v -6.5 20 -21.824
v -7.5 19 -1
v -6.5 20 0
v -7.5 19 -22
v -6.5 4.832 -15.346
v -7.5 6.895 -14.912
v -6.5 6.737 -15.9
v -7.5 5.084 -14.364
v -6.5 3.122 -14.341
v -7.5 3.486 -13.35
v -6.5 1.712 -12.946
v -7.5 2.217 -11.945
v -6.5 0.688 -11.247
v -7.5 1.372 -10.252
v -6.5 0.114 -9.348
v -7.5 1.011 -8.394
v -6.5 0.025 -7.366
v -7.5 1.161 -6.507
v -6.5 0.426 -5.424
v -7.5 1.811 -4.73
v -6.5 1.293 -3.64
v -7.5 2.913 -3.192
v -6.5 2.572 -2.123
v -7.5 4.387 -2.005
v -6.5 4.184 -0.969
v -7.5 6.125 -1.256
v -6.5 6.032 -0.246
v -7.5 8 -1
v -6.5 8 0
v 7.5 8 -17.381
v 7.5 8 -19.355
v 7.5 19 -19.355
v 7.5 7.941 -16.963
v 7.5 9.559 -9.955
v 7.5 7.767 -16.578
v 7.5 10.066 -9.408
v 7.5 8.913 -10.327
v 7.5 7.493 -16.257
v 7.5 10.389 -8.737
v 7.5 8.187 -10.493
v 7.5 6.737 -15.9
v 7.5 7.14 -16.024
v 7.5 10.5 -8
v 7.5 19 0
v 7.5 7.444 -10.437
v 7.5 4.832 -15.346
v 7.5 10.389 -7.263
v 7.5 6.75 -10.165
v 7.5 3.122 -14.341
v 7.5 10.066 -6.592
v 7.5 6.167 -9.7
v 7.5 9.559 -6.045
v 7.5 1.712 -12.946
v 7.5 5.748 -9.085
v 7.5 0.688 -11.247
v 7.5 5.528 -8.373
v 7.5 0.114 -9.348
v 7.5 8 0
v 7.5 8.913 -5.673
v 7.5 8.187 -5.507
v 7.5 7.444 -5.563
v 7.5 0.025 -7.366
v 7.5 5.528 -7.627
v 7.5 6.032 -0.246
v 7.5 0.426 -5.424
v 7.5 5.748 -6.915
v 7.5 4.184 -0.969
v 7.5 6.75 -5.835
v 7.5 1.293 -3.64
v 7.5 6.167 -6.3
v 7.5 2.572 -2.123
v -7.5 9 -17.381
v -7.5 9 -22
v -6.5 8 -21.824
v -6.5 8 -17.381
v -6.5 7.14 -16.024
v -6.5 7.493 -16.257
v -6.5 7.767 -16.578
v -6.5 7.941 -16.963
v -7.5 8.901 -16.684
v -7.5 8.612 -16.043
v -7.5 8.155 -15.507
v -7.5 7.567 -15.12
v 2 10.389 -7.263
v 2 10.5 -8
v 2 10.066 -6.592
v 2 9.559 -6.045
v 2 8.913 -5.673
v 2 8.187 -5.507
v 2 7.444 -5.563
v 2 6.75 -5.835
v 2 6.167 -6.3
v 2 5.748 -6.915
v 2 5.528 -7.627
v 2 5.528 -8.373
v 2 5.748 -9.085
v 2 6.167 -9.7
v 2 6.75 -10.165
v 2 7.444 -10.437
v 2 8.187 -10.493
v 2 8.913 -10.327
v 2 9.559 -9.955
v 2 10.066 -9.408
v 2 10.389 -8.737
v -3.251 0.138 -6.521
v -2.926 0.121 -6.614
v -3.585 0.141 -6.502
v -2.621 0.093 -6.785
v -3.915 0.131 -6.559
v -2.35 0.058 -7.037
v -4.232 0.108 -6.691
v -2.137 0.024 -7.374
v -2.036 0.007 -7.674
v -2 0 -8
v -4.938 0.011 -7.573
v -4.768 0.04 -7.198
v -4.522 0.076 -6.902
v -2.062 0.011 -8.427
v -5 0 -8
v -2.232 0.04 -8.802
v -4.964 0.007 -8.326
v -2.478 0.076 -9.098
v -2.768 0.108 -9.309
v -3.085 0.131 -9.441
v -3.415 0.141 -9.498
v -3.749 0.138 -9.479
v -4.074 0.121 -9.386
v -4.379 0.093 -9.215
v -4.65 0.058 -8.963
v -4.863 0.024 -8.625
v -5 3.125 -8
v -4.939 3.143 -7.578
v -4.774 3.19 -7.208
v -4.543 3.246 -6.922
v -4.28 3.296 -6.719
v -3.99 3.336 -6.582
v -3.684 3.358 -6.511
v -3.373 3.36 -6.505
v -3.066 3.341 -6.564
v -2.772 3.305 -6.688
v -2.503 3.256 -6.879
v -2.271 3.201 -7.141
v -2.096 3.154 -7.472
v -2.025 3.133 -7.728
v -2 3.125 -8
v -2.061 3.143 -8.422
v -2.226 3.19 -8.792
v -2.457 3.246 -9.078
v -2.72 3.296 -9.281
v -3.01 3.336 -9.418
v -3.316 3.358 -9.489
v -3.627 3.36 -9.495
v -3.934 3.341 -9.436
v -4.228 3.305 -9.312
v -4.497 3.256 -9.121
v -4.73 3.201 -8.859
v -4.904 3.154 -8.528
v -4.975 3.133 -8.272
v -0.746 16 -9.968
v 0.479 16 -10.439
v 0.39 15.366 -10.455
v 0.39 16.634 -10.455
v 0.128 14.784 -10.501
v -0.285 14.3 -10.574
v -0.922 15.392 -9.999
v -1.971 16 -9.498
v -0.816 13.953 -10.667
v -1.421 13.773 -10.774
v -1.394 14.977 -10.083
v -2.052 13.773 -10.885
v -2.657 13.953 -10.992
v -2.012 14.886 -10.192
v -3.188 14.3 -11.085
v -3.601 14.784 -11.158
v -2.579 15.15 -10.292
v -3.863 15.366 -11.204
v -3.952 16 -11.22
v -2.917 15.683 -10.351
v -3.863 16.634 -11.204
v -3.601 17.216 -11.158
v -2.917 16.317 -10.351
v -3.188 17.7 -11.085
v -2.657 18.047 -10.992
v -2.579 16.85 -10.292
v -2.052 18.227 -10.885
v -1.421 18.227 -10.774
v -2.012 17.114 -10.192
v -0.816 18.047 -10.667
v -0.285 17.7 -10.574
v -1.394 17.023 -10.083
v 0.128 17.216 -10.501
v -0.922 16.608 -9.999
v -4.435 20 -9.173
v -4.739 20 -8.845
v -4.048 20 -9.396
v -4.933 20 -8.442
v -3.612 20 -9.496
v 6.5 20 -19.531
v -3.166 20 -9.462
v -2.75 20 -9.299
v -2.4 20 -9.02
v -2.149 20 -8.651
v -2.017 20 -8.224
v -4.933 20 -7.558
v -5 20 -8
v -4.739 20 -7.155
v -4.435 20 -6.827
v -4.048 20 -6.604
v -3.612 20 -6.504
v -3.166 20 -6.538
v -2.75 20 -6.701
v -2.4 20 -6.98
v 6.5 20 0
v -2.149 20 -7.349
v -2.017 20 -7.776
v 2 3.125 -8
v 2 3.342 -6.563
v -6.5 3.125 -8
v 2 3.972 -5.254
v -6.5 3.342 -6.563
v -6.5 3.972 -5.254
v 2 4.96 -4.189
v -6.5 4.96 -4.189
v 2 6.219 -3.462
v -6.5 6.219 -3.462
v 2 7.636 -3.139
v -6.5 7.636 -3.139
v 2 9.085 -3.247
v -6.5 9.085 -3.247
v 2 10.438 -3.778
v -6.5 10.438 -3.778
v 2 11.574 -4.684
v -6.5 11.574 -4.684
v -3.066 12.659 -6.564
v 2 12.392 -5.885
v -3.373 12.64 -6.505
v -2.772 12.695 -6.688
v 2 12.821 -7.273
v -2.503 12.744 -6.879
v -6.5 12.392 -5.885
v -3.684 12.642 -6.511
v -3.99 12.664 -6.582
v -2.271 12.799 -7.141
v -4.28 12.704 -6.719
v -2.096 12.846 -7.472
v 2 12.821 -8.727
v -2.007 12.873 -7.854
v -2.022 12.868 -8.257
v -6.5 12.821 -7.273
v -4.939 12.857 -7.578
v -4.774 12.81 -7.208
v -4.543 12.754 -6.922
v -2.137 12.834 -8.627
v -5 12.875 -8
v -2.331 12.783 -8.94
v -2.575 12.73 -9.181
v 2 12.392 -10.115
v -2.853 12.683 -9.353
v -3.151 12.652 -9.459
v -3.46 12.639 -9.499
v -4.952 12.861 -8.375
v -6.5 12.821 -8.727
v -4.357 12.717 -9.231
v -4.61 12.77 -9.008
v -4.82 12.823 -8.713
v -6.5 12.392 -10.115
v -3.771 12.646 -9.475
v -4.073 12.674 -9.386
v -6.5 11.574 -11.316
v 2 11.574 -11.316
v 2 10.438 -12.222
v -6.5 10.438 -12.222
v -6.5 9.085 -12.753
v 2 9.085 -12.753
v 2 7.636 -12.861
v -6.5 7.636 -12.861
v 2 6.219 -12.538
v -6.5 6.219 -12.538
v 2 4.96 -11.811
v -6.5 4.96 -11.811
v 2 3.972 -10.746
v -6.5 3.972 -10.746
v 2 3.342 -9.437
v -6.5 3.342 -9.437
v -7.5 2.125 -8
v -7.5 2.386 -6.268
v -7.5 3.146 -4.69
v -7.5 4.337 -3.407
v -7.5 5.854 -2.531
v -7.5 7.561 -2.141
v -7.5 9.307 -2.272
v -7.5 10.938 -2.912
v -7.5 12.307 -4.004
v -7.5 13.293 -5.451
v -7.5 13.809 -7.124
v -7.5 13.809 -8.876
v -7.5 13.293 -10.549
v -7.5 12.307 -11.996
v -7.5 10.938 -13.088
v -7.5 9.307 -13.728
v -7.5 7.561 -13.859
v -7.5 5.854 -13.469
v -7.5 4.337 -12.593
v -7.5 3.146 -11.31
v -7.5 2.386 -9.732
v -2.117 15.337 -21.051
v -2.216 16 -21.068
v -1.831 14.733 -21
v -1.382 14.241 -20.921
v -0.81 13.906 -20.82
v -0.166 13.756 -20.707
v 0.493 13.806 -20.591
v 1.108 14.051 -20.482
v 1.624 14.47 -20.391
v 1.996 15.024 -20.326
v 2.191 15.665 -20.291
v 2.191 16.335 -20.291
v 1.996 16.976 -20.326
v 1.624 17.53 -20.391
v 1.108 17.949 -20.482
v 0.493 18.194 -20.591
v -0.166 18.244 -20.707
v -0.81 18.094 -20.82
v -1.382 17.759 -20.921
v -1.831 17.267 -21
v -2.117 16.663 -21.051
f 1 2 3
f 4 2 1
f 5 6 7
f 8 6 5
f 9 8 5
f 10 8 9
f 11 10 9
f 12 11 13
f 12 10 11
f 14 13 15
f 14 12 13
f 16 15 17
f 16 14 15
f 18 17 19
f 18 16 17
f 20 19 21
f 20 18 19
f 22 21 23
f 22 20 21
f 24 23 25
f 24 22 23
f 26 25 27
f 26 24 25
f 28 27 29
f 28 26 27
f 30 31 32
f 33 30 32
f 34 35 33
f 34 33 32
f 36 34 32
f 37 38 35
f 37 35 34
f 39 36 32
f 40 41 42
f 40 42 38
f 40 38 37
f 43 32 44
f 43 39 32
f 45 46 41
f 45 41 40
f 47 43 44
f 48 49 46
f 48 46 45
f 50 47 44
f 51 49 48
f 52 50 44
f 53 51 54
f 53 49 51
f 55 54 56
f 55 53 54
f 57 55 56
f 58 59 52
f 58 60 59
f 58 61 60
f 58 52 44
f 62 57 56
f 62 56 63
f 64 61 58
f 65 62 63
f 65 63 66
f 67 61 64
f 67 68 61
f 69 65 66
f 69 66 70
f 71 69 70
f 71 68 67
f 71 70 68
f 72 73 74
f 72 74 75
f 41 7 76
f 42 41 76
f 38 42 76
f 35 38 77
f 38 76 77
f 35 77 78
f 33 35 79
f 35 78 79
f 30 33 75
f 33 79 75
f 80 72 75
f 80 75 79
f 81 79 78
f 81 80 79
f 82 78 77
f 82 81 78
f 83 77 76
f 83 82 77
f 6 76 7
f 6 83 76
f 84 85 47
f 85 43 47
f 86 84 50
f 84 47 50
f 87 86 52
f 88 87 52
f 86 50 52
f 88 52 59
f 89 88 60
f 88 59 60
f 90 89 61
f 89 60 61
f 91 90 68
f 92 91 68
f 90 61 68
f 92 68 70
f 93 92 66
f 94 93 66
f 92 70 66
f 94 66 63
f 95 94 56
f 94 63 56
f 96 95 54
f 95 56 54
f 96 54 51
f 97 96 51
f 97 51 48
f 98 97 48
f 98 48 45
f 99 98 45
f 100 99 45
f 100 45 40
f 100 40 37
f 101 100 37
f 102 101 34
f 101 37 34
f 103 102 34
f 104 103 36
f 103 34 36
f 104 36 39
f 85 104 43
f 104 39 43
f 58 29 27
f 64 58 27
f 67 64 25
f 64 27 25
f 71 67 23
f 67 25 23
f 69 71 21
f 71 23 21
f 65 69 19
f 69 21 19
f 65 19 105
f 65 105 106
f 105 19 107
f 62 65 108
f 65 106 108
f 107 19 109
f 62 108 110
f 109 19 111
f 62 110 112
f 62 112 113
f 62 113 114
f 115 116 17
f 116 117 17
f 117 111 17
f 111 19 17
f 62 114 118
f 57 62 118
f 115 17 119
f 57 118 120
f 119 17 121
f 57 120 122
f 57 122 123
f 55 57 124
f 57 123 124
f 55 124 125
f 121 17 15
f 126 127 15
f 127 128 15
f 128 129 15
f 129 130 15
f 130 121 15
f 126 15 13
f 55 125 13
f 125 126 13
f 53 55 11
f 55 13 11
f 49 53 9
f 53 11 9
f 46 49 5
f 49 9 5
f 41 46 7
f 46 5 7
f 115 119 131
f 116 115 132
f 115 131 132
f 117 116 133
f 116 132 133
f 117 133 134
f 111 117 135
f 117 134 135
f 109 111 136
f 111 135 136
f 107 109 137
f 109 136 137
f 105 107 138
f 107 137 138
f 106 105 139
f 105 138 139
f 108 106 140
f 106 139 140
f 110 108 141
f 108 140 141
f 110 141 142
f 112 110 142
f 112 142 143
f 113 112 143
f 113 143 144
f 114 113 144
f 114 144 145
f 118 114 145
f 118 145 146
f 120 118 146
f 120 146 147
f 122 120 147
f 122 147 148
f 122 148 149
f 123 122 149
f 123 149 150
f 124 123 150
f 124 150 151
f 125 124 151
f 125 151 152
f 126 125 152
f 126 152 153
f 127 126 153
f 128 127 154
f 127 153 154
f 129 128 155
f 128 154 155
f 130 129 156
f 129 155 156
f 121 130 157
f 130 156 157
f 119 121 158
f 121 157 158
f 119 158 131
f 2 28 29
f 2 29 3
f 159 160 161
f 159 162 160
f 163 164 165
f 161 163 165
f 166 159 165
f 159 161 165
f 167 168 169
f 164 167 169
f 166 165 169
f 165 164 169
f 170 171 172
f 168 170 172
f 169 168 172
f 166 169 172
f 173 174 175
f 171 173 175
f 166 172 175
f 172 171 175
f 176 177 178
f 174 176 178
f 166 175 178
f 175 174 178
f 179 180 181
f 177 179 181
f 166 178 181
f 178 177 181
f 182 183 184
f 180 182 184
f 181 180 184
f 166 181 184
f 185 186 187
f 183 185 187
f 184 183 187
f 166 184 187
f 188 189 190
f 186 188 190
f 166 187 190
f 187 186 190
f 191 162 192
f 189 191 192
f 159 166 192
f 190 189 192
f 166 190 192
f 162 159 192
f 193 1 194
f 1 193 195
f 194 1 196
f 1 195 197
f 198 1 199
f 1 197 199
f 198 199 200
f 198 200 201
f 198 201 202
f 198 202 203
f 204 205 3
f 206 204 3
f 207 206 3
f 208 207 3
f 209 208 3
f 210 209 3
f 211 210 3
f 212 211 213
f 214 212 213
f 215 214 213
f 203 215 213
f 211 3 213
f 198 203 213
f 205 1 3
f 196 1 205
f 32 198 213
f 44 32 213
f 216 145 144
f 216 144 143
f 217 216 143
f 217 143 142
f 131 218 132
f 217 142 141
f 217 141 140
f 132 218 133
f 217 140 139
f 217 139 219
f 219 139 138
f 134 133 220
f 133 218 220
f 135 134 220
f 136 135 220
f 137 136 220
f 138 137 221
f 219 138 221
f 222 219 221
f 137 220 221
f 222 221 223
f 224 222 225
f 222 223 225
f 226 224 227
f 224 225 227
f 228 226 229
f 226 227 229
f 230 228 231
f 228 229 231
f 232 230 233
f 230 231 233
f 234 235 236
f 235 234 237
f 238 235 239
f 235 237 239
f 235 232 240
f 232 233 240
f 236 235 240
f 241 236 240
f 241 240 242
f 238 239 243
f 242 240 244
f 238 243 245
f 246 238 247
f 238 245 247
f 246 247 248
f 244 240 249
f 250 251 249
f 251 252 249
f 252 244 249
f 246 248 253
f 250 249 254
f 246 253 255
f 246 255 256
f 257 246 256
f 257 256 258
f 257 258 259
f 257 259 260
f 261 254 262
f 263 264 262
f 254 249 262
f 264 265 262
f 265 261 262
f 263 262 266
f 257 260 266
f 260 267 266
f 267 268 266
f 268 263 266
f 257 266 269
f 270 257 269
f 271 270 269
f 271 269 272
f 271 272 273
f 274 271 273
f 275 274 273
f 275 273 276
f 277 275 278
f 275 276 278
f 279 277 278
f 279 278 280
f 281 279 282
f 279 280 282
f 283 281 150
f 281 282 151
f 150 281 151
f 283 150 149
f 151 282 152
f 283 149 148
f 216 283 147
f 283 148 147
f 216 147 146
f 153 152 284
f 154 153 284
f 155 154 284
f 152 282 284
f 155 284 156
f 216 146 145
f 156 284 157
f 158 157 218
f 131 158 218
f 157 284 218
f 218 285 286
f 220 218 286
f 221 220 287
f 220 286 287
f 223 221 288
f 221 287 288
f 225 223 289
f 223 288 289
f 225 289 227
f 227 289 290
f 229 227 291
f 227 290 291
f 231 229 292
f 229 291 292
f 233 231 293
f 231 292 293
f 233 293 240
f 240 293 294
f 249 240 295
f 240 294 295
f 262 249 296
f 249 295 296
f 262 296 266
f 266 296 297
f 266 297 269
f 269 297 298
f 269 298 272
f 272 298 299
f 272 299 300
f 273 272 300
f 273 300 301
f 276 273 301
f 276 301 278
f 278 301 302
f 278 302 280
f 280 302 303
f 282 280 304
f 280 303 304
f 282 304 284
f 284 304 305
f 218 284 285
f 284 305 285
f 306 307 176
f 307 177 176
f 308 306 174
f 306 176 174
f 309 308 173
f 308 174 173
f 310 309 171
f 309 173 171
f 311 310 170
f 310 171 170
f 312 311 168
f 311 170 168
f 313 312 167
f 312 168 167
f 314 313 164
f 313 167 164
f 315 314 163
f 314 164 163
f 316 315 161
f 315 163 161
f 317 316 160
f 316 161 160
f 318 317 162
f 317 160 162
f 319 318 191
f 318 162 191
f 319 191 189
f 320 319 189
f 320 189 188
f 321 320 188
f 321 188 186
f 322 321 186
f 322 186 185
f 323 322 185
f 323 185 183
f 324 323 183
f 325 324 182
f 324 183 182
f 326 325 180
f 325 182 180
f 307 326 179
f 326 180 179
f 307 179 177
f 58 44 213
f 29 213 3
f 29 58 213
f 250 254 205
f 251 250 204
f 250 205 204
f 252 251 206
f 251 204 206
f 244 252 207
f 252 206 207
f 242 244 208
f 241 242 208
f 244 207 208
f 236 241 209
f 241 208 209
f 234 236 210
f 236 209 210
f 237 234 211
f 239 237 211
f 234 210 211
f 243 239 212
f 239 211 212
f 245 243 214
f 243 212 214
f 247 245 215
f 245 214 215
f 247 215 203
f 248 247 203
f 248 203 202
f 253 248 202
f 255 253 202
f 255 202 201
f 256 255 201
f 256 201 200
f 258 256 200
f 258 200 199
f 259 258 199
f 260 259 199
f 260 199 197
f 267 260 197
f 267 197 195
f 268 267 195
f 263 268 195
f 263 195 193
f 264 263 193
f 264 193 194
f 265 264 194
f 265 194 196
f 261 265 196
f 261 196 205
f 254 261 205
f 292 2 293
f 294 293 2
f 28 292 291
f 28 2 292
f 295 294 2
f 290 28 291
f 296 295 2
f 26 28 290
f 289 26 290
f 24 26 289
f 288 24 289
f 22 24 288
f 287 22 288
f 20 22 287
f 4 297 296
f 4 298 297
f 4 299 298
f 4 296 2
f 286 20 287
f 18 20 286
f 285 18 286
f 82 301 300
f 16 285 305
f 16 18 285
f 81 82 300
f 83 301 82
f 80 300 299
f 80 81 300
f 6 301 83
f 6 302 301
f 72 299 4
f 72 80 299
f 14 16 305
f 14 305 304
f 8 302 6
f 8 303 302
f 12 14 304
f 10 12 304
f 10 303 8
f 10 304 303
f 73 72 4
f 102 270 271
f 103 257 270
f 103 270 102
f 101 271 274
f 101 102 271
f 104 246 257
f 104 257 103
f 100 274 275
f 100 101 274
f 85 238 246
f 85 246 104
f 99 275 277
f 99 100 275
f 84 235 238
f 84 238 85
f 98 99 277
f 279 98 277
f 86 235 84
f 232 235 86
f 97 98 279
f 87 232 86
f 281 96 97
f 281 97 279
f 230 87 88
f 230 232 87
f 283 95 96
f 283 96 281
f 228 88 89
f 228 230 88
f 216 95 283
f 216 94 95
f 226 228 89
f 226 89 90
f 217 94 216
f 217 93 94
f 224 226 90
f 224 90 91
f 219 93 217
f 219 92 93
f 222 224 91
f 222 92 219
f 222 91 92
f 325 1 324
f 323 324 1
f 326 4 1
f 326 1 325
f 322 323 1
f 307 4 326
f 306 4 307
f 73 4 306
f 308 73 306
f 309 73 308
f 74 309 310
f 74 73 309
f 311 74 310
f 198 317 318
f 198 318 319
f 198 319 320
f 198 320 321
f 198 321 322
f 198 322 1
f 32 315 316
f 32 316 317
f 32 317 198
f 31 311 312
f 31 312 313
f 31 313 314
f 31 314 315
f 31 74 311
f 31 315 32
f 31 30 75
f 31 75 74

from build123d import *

# Parameters (mm, degrees)
F1_DEPTH       = 20
F3_D           = 5
F3_CBORE_D     = 9.75
F3_CBORE_DEPTH = 9.5
F5_D           = 4.5
F5_DEPTH       = 10
F5_TIP         = 1.3519363928
F6_R           = 1.5
F7_DEPTH       = 25
F9_DEPTH       = 15.001
F10_SIZE       = 1


with BuildPart() as f1:
    # F0 (on Front) → F1 (new body)
    with BuildSketch(Plane.XZ):
        Polygon((7.5, 0), (-7.5, 0), (-7.5, -22), (7.5, -19.3550952894), align=None)
    extrude(amount=-F1_DEPTH)

    # F3 (through all)
    with Locations(Plane(origin=(-7.5, 0, 0), x_dir=(0, -1, 0), z_dir=(-1, 0, 0))):
        with Locations((-8, -8)):
            CounterBoreHole(F3_D / 2, F3_CBORE_D / 2, F3_CBORE_DEPTH)

    # F5
    with Locations(Plane(origin=(3.5360689045, 0, -20.0540432912), x_dir=(0.984807753, 0, 0.1736481777), z_dir=(0.1736481777, 0, -0.984807753))):
        with Locations((-3.5906184671, -16)):
            Hole(F5_D / 2, depth=F5_DEPTH)
            with Locations((0, 0, -(F5_DEPTH + F5_TIP / 2))):  # 118° drill point
                Cone(0, F5_D / 2, F5_TIP, mode=Mode.SUBTRACT)

    # F6 (on face) → F7 (cut)
    with BuildSketch(Plane(origin=(0, 20, 0), x_dir=(-1, 0, 0), z_dir=(0, 1, 0))):
        with Locations((3.5, -8)):
            Circle(F6_R)
    extrude(amount=-F7_DEPTH, mode=Mode.SUBTRACT)

    # F8 (on face) → F9 (cut, through all)
    with BuildSketch(Plane(origin=(-7.5, 0, 0), x_dir=(0, -1, 0), z_dir=(-1, 0, 0))):
        with BuildLine():
            Line((0, 0), (-8, 0))
            ThreePointArc((-8, 0), (-2.3431457505, -2.3431457505), (0, -8))
            Line((0, -8), (0, 0))
        make_face()
        with BuildLine():
            Line((-8, -17.3808315196), (-8, -22))
            Line((-8, -22), (0, -22))
            Line((0, -22), (0, -8))
            ThreePointArc((0, -8), (-1.912912718, -13.1910854762), (-6.7368421053, -15.8996475955))
            ThreePointArc((-6.7368421053, -15.8996475955), (-7.6413288654, -16.4075029929), (-8, -17.3808315196))
        make_face()
    extrude(amount=-F9_DEPTH, mode=Mode.SUBTRACT)

    # F10
    f10_edges = [f1.edges().sort_by_distance(p)[0] for p in [
        (7.5, 20, -9.677548),
        (-7.5, 20, -11),
        (-7.5, 14, 0),
        (-7.5, 8, -19.690416),
        (-7.5, 12.875, -8),
        (-7.5, 7.641329, -16.407503),
        (-7.5, 0.025128, -7.366431),
    ]]
    chamfer(f10_edges, length=F10_SIZE)


solid = f1.part
